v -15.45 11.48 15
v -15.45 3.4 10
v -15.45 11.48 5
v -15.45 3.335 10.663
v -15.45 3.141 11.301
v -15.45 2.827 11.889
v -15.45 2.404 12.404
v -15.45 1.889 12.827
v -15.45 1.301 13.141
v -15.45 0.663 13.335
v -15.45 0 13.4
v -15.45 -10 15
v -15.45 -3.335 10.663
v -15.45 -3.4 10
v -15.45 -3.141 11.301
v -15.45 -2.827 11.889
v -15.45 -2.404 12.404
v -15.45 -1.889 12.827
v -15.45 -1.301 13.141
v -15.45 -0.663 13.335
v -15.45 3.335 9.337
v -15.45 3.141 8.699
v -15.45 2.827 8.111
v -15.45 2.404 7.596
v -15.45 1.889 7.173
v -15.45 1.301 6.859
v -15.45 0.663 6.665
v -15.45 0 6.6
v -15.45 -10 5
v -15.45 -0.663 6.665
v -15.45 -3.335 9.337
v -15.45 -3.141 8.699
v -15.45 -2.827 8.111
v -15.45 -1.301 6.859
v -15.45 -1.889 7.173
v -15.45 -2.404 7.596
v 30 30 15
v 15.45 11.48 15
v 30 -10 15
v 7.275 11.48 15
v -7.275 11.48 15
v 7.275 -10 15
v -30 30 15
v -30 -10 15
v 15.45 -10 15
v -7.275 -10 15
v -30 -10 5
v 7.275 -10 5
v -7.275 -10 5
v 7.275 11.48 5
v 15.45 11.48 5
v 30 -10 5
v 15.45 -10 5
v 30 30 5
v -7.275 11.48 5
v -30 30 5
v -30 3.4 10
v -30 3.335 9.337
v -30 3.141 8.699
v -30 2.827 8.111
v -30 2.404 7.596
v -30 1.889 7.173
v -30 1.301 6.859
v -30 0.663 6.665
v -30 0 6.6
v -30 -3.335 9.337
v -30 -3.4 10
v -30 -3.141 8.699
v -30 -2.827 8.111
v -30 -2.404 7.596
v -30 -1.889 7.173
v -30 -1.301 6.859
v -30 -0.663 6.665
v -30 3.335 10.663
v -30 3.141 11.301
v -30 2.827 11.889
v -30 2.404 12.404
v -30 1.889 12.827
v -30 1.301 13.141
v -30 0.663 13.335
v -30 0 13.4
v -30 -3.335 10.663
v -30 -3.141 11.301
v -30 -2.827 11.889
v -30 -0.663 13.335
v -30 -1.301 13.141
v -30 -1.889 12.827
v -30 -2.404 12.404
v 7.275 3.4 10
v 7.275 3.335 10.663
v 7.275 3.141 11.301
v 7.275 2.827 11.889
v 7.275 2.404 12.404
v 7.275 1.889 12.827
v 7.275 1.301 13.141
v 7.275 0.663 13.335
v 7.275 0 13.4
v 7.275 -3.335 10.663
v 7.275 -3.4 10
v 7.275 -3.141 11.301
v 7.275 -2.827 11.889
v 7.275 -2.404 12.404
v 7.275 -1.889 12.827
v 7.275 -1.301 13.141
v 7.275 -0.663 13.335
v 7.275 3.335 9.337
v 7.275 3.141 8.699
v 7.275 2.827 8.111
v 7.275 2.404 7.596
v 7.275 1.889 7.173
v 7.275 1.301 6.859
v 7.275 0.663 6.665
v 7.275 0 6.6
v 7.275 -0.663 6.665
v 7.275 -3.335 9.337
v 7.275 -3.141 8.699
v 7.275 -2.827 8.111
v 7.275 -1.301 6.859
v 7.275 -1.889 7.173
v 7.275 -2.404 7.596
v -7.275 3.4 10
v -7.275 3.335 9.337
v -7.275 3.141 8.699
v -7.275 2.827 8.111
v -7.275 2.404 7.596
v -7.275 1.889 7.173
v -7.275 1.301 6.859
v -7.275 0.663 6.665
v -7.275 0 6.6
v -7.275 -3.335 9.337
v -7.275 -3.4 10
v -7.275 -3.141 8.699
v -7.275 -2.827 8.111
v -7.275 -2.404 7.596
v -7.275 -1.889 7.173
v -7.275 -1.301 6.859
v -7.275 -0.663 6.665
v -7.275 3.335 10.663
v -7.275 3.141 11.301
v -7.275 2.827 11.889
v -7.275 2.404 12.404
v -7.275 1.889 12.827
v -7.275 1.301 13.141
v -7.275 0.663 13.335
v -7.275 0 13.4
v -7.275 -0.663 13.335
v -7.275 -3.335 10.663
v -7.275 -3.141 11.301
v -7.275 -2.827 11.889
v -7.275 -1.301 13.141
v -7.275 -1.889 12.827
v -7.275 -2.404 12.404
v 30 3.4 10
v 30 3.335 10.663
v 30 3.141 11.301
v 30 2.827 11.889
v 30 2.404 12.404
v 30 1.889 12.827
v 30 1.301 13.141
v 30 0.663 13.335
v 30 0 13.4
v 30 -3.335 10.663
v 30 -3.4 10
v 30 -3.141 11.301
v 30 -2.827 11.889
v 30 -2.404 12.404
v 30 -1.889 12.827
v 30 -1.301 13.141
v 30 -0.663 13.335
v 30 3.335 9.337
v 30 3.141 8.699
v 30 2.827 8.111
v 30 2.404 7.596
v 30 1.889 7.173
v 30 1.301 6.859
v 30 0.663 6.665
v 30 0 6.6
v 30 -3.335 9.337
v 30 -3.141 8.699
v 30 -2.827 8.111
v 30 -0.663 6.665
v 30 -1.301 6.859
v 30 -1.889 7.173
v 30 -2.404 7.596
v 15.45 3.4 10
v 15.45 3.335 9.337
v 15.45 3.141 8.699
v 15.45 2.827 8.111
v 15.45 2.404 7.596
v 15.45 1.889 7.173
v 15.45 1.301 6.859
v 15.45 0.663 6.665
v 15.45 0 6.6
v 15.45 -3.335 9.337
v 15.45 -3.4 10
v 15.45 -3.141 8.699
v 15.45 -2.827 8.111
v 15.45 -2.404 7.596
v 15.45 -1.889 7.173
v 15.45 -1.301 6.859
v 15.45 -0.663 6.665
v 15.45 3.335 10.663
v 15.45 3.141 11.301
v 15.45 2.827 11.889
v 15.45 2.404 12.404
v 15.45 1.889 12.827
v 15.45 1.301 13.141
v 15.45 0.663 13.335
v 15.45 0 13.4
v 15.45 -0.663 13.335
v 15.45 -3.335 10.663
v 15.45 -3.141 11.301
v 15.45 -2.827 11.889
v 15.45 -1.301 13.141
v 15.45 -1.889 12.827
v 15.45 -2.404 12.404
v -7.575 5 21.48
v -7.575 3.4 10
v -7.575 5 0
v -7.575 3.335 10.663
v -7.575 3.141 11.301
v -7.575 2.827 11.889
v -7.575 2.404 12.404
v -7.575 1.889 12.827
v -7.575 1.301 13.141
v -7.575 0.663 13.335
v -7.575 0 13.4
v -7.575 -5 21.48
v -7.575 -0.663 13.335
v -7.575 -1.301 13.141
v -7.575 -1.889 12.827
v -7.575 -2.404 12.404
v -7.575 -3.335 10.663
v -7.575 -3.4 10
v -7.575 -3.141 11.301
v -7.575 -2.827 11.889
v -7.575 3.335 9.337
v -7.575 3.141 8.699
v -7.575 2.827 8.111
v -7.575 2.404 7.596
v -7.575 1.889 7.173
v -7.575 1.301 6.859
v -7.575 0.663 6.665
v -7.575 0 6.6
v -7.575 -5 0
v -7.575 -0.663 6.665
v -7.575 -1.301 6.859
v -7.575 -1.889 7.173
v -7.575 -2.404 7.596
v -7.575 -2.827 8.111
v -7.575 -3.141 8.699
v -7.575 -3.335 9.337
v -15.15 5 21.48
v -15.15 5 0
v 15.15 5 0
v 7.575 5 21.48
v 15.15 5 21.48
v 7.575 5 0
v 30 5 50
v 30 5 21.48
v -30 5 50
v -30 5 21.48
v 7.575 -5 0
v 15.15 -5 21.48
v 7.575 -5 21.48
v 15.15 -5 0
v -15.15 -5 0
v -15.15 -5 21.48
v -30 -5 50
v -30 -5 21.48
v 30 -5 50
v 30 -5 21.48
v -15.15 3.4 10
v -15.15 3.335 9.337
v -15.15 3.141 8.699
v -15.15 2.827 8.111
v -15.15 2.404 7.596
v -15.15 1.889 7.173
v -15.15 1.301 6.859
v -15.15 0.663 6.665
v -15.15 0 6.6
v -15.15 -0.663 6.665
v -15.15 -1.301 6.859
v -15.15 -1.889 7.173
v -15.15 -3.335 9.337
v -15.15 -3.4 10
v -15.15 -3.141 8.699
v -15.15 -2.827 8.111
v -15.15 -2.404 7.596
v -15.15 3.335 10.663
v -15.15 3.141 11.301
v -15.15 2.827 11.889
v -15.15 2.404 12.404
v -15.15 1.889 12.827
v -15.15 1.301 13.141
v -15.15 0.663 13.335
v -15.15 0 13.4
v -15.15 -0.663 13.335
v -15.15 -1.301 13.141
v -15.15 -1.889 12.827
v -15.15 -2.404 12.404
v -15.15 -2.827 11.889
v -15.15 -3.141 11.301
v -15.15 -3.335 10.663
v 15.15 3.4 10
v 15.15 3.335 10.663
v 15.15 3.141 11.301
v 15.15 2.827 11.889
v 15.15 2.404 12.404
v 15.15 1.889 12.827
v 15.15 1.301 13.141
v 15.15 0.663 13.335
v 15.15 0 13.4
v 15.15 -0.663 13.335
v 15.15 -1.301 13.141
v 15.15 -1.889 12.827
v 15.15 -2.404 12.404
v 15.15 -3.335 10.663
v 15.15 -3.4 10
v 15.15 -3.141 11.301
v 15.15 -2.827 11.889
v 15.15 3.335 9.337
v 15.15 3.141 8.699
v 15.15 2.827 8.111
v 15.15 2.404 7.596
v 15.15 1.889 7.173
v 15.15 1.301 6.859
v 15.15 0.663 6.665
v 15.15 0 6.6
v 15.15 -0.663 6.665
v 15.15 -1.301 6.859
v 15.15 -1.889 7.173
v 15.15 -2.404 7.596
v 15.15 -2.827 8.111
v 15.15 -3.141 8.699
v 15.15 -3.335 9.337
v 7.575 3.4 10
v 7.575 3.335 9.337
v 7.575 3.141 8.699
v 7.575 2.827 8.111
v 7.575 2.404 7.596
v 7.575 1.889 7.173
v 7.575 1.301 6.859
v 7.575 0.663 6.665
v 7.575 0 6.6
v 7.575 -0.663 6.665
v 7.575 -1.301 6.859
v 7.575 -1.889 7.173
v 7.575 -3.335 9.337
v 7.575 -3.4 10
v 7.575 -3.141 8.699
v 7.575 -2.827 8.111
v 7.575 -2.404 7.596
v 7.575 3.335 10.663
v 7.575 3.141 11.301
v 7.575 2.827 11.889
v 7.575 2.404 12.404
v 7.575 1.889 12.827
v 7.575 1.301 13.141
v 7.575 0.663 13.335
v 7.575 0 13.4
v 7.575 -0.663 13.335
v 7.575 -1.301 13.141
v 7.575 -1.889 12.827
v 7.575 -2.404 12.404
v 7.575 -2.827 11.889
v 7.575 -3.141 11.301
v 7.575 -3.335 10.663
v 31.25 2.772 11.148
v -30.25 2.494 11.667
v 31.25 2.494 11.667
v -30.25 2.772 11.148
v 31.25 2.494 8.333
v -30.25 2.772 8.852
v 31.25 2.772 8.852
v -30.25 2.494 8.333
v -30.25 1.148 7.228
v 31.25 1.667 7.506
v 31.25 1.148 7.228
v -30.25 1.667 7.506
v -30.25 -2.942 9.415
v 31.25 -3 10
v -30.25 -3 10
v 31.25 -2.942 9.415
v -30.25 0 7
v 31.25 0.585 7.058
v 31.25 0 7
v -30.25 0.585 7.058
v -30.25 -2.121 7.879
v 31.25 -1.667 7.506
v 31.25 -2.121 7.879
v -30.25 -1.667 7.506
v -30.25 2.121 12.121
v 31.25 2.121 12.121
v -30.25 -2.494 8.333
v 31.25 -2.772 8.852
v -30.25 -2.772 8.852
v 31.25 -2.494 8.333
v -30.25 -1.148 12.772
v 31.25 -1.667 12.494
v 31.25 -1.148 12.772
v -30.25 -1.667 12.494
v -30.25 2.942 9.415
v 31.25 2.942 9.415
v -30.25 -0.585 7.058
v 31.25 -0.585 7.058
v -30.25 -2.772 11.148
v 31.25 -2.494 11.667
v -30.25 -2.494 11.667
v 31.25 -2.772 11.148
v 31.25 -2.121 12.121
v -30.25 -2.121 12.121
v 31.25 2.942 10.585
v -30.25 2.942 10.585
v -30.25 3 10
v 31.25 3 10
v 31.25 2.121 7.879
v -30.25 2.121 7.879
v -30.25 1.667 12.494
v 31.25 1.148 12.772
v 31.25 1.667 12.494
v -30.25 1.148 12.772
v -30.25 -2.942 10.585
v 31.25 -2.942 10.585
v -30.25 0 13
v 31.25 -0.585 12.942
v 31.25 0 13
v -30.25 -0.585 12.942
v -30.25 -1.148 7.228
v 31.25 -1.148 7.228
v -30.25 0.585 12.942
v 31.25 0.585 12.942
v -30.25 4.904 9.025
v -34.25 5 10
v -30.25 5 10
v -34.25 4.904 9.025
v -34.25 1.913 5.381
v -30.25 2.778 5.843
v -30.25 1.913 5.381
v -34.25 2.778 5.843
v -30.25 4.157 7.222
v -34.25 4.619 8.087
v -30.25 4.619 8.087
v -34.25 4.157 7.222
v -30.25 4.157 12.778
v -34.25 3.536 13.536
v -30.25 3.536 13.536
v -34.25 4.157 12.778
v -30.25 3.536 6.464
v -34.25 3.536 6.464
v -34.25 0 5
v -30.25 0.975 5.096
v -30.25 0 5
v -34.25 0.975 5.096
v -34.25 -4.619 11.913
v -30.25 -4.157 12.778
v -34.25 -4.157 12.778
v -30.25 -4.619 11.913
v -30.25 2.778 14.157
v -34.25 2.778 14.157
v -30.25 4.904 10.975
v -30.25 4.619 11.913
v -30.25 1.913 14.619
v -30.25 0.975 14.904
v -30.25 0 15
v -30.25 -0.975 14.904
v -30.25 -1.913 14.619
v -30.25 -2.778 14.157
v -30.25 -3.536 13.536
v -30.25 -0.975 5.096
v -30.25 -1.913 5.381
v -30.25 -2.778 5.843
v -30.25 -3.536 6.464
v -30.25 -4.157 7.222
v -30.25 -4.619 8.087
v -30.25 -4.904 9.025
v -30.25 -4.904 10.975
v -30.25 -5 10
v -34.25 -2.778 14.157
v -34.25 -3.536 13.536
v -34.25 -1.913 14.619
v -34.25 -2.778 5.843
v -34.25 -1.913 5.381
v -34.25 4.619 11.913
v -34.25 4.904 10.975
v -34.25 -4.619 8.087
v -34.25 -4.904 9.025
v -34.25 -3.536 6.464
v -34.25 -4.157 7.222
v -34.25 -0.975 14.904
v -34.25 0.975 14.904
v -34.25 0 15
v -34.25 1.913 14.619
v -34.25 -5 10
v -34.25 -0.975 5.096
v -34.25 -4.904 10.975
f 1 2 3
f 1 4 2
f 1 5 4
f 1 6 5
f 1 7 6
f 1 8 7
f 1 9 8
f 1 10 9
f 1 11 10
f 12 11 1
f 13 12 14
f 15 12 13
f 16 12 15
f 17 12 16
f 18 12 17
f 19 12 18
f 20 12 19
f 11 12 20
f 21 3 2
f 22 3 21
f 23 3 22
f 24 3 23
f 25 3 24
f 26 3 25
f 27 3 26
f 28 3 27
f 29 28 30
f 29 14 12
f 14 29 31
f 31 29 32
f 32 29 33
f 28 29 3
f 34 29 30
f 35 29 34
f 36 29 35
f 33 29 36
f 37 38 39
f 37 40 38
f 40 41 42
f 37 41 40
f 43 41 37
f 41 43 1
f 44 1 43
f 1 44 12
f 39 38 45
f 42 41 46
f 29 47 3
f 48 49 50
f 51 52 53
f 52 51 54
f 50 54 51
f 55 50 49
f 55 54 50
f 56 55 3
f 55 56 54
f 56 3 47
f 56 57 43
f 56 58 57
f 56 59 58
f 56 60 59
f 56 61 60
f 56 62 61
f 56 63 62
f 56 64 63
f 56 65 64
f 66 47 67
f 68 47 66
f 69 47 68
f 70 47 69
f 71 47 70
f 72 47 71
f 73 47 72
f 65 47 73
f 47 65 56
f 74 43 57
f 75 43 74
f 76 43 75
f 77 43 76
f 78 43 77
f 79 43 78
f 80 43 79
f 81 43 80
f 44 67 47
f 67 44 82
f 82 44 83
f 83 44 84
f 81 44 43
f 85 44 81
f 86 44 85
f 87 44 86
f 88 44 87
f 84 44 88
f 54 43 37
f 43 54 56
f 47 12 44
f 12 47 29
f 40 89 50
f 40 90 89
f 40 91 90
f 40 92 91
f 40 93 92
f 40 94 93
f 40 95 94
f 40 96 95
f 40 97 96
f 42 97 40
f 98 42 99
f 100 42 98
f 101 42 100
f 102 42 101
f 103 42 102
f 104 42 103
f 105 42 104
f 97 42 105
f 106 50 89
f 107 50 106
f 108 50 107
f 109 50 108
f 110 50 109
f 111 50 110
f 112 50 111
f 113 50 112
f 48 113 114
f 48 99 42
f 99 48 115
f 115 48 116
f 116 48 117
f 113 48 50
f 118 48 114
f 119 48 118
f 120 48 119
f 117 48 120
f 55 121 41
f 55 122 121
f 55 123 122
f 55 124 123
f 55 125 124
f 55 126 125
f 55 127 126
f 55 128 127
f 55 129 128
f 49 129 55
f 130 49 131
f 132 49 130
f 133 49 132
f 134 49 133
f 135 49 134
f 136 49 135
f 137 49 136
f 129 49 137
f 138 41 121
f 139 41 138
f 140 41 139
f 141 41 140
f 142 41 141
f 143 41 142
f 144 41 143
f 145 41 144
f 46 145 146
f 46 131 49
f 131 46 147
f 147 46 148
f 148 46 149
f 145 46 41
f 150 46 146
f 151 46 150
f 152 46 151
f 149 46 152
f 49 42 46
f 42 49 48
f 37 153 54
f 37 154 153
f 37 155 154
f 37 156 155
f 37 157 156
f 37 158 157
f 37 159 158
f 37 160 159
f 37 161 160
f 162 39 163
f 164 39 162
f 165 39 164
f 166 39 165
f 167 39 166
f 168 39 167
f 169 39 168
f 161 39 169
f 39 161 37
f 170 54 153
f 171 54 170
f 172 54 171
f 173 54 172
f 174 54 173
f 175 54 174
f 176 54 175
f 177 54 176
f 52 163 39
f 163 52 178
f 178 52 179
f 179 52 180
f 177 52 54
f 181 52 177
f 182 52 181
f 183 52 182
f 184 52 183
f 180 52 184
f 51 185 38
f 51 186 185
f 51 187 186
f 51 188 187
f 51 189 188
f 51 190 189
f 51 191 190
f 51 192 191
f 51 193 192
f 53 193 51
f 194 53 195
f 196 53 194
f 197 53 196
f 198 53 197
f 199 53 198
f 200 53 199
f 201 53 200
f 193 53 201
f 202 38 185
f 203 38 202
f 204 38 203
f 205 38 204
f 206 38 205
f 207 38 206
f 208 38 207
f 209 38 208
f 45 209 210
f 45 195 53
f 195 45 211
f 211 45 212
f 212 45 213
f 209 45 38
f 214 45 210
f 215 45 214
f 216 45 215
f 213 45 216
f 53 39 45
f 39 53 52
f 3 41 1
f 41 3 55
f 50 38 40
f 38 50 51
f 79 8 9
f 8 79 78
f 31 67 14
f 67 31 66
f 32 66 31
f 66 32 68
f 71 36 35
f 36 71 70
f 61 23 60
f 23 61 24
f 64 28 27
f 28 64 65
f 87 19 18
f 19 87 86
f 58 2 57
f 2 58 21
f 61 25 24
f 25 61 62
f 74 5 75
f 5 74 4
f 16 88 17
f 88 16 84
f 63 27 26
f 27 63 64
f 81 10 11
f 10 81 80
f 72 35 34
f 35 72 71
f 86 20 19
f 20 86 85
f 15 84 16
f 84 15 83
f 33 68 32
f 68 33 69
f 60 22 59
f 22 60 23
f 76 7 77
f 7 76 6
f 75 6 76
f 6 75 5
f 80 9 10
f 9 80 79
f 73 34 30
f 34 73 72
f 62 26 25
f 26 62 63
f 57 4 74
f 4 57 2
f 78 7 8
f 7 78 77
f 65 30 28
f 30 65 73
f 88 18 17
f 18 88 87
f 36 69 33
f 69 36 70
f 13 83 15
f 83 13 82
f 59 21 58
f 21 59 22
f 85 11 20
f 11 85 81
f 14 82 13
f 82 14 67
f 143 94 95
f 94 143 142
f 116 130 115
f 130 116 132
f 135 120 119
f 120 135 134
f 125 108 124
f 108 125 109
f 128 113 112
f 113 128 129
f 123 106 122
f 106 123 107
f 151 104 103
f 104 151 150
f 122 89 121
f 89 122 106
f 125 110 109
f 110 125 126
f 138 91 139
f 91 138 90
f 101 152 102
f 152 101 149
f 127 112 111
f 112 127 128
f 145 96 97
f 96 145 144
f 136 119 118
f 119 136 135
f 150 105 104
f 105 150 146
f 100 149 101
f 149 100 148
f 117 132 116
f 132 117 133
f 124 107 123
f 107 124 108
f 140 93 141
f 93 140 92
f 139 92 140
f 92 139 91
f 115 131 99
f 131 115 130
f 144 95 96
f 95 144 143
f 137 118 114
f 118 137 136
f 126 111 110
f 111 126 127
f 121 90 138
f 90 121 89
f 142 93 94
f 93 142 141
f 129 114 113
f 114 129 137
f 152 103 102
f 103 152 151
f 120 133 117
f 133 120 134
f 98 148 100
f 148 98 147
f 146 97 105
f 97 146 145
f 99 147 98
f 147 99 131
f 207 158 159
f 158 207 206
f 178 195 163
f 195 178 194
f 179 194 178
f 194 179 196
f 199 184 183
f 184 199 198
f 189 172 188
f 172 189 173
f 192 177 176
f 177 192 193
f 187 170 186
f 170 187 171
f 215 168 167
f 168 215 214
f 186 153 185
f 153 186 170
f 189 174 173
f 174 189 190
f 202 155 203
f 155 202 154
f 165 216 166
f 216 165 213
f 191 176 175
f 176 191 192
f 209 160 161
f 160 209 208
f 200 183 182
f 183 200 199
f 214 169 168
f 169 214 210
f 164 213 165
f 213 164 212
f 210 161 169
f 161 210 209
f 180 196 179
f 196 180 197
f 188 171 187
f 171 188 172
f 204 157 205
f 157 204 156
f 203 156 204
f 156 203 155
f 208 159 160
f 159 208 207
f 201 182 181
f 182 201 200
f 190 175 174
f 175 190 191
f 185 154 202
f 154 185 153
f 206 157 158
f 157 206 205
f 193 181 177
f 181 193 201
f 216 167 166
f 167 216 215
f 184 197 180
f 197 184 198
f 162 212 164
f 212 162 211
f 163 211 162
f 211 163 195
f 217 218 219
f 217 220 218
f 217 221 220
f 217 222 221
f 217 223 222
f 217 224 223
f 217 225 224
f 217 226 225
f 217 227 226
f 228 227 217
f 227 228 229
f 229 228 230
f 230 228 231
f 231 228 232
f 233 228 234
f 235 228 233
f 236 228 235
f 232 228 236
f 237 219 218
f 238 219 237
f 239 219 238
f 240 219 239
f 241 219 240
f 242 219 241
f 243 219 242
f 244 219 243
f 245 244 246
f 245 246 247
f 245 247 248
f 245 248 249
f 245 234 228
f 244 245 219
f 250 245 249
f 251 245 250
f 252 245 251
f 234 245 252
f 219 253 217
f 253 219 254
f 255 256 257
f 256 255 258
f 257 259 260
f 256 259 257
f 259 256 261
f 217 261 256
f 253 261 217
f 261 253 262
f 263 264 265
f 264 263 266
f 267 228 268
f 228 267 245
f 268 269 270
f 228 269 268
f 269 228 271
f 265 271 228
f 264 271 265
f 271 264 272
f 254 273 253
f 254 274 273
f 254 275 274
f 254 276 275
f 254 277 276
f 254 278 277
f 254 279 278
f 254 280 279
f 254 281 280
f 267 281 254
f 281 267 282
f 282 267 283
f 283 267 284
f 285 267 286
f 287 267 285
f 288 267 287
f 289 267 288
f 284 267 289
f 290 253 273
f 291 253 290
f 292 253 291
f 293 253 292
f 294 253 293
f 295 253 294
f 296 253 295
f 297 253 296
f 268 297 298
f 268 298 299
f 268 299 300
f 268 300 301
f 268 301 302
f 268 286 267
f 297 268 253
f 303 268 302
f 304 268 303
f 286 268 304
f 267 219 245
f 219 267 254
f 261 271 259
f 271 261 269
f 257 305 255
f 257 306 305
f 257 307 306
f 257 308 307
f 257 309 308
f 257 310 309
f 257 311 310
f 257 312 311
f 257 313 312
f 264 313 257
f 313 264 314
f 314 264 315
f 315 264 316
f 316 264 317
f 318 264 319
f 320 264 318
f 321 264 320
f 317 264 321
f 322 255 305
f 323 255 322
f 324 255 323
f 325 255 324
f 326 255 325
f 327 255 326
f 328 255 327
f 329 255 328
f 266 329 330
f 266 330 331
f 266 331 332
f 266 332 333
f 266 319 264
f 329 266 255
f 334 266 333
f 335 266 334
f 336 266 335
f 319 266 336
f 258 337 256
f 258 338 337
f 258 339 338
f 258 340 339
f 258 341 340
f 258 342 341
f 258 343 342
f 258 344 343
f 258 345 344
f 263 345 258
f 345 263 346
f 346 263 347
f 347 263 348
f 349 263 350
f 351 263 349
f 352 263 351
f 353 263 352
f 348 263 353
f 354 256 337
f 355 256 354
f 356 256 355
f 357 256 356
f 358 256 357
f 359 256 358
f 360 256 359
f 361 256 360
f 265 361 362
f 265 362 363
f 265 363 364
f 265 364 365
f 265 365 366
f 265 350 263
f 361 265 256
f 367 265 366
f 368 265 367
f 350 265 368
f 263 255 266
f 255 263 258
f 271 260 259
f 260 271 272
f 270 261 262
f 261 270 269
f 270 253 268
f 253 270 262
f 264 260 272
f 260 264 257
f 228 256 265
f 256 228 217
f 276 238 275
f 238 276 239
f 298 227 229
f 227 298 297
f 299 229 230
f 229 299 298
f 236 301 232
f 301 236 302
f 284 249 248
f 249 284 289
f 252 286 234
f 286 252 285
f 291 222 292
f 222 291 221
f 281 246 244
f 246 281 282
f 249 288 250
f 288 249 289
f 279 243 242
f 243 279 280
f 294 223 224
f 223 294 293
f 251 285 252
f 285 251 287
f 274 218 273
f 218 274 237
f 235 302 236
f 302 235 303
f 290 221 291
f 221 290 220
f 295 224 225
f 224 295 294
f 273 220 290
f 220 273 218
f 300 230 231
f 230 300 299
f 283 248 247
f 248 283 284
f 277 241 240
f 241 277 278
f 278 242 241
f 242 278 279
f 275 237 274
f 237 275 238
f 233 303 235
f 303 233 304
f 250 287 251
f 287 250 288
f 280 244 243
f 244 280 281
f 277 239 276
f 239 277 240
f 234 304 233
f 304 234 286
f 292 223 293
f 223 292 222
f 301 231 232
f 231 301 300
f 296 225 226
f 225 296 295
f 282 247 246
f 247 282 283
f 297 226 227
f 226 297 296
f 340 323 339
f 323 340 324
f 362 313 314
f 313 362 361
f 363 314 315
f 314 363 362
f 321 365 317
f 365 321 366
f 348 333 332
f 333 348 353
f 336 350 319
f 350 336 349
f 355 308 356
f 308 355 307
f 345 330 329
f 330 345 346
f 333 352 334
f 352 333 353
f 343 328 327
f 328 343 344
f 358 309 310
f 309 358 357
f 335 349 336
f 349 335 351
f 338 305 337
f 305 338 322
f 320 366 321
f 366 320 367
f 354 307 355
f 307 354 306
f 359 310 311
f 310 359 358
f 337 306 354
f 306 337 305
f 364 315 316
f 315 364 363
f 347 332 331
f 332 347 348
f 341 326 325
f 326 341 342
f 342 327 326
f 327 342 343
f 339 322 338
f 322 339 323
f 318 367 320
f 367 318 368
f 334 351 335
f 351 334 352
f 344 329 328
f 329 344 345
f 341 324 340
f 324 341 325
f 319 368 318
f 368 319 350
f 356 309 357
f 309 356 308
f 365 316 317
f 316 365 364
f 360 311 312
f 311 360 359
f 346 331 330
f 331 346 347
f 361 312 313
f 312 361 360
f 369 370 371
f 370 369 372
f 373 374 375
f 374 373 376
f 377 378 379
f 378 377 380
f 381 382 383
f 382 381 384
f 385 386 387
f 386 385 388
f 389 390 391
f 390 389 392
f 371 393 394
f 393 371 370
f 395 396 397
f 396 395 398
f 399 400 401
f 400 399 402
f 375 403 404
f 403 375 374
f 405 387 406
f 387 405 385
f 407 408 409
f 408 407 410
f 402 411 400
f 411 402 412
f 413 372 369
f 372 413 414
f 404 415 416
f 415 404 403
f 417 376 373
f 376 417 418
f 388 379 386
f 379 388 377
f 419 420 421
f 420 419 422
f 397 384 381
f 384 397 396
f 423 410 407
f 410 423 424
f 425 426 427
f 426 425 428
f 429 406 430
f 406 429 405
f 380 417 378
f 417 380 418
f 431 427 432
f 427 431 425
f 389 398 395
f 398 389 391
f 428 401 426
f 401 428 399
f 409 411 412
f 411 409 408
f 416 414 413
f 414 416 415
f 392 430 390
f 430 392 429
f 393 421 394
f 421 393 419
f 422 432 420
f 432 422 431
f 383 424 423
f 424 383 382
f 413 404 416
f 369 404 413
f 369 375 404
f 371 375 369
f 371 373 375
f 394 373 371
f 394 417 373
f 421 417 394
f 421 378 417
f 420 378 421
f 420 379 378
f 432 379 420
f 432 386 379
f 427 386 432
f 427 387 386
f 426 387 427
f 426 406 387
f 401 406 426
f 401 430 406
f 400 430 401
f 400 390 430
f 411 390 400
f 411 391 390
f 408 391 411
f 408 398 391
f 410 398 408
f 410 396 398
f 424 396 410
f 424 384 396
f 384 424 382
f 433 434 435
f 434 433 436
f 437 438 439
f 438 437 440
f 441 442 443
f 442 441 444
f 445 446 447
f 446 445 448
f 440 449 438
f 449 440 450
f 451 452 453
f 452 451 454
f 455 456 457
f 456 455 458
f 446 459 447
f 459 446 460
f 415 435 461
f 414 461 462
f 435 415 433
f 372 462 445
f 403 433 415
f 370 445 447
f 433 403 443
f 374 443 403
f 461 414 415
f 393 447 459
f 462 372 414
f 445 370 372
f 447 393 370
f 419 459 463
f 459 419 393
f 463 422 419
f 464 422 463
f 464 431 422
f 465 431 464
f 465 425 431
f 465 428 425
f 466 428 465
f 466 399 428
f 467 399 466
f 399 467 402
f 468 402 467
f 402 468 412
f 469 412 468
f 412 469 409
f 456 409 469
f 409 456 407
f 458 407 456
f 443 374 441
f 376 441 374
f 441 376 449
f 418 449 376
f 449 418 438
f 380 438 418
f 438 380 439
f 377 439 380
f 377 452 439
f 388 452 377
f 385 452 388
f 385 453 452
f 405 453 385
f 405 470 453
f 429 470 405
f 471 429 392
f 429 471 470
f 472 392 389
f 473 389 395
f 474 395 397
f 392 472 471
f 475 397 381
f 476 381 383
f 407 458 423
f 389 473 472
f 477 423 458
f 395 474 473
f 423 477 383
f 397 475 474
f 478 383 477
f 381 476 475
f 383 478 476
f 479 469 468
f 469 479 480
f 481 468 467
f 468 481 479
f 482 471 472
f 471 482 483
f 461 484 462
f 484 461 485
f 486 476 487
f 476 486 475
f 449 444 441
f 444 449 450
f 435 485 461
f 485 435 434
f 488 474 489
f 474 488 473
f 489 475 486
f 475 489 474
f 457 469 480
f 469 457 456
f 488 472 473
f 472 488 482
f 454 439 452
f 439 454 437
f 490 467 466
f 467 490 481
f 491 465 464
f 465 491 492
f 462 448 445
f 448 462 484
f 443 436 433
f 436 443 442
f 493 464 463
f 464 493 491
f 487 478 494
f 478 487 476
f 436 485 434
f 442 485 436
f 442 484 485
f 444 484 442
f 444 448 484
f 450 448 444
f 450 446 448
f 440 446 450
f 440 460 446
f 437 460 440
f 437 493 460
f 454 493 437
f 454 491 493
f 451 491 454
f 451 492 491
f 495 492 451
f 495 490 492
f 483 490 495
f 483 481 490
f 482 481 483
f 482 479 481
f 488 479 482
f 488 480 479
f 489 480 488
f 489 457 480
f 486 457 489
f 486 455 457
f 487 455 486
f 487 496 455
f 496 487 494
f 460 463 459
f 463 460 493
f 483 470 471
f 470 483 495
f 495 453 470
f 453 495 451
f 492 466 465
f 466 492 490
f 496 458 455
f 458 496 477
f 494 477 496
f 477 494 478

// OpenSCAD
$fn = 32;

// ------------------------------------------------------------------------
// Butt hinge: hinge 60 mm, leaf swung 270 deg
// Every part is its own module, assembly() places every instance.
// ------------------------------------------------------------------------

// --- part 1 ---
module hinge_base() {
  difference() {
    union() {
      translate([-30, -10, -5]) cube([14.55, 40, 10]);
      translate([-7.275, -10, -5]) cube([14.55, 40, 10]);
      translate([15.45, -10, -5]) cube([14.55, 40, 10]);
      translate([-30, 11.48, -5]) cube([60, 18.52, 10]);
    }
    translate([-22.725, 0, 0]) rotate([0, 90, 0]) cylinder(h = 16.55, d = 6.8, center = true);
    translate([0, 0, 0]) rotate([0, 90, 0]) cylinder(h = 16.55, d = 6.8, center = true);
    translate([22.725, 0, 0]) rotate([0, 90, 0]) cylinder(h = 16.55, d = 6.8, center = true);
  }
}

// --- part 2 ---
module hinge_mover() {
  difference() {
    union() {
      translate([-15.15, -40, -5]) cube([7.575, 50, 10]);
      translate([7.575, -40, -5]) cube([7.575, 50, 10]);
      translate([-30, -40, -5]) cube([60, 28.52, 10]);
    }
    translate([-11.362, 0, 0]) rotate([0, 90, 0]) cylinder(h = 9.575, d = 6.8, center = true);
    translate([11.362, 0, 0]) rotate([0, 90, 0]) cylinder(h = 9.575, d = 6.8, center = true);
  }
}

// --- part 3 ---
module hinge_pin() {
  rotate([0, 90, 0]) cylinder(h = 62.5, d = 6, center = true);
  translate([-34.25, 0, 0]) rotate([0, 90, 0]) cylinder(h = 4, d = 10);
}

// --- assembly ---
module assembly() {
  color([0.80, 0.24, 0.20]) translate([0, 0, 10]) rotate([0, 0, 0]) hinge_base();
  color([0.20, 0.45, 0.75]) translate([0, 0, 10]) rotate([270, 0, 0]) hinge_mover();
  color([0.25, 0.62, 0.32]) translate([0, 0, 10]) rotate([0, 0, 0]) hinge_pin();
}

assembly();
